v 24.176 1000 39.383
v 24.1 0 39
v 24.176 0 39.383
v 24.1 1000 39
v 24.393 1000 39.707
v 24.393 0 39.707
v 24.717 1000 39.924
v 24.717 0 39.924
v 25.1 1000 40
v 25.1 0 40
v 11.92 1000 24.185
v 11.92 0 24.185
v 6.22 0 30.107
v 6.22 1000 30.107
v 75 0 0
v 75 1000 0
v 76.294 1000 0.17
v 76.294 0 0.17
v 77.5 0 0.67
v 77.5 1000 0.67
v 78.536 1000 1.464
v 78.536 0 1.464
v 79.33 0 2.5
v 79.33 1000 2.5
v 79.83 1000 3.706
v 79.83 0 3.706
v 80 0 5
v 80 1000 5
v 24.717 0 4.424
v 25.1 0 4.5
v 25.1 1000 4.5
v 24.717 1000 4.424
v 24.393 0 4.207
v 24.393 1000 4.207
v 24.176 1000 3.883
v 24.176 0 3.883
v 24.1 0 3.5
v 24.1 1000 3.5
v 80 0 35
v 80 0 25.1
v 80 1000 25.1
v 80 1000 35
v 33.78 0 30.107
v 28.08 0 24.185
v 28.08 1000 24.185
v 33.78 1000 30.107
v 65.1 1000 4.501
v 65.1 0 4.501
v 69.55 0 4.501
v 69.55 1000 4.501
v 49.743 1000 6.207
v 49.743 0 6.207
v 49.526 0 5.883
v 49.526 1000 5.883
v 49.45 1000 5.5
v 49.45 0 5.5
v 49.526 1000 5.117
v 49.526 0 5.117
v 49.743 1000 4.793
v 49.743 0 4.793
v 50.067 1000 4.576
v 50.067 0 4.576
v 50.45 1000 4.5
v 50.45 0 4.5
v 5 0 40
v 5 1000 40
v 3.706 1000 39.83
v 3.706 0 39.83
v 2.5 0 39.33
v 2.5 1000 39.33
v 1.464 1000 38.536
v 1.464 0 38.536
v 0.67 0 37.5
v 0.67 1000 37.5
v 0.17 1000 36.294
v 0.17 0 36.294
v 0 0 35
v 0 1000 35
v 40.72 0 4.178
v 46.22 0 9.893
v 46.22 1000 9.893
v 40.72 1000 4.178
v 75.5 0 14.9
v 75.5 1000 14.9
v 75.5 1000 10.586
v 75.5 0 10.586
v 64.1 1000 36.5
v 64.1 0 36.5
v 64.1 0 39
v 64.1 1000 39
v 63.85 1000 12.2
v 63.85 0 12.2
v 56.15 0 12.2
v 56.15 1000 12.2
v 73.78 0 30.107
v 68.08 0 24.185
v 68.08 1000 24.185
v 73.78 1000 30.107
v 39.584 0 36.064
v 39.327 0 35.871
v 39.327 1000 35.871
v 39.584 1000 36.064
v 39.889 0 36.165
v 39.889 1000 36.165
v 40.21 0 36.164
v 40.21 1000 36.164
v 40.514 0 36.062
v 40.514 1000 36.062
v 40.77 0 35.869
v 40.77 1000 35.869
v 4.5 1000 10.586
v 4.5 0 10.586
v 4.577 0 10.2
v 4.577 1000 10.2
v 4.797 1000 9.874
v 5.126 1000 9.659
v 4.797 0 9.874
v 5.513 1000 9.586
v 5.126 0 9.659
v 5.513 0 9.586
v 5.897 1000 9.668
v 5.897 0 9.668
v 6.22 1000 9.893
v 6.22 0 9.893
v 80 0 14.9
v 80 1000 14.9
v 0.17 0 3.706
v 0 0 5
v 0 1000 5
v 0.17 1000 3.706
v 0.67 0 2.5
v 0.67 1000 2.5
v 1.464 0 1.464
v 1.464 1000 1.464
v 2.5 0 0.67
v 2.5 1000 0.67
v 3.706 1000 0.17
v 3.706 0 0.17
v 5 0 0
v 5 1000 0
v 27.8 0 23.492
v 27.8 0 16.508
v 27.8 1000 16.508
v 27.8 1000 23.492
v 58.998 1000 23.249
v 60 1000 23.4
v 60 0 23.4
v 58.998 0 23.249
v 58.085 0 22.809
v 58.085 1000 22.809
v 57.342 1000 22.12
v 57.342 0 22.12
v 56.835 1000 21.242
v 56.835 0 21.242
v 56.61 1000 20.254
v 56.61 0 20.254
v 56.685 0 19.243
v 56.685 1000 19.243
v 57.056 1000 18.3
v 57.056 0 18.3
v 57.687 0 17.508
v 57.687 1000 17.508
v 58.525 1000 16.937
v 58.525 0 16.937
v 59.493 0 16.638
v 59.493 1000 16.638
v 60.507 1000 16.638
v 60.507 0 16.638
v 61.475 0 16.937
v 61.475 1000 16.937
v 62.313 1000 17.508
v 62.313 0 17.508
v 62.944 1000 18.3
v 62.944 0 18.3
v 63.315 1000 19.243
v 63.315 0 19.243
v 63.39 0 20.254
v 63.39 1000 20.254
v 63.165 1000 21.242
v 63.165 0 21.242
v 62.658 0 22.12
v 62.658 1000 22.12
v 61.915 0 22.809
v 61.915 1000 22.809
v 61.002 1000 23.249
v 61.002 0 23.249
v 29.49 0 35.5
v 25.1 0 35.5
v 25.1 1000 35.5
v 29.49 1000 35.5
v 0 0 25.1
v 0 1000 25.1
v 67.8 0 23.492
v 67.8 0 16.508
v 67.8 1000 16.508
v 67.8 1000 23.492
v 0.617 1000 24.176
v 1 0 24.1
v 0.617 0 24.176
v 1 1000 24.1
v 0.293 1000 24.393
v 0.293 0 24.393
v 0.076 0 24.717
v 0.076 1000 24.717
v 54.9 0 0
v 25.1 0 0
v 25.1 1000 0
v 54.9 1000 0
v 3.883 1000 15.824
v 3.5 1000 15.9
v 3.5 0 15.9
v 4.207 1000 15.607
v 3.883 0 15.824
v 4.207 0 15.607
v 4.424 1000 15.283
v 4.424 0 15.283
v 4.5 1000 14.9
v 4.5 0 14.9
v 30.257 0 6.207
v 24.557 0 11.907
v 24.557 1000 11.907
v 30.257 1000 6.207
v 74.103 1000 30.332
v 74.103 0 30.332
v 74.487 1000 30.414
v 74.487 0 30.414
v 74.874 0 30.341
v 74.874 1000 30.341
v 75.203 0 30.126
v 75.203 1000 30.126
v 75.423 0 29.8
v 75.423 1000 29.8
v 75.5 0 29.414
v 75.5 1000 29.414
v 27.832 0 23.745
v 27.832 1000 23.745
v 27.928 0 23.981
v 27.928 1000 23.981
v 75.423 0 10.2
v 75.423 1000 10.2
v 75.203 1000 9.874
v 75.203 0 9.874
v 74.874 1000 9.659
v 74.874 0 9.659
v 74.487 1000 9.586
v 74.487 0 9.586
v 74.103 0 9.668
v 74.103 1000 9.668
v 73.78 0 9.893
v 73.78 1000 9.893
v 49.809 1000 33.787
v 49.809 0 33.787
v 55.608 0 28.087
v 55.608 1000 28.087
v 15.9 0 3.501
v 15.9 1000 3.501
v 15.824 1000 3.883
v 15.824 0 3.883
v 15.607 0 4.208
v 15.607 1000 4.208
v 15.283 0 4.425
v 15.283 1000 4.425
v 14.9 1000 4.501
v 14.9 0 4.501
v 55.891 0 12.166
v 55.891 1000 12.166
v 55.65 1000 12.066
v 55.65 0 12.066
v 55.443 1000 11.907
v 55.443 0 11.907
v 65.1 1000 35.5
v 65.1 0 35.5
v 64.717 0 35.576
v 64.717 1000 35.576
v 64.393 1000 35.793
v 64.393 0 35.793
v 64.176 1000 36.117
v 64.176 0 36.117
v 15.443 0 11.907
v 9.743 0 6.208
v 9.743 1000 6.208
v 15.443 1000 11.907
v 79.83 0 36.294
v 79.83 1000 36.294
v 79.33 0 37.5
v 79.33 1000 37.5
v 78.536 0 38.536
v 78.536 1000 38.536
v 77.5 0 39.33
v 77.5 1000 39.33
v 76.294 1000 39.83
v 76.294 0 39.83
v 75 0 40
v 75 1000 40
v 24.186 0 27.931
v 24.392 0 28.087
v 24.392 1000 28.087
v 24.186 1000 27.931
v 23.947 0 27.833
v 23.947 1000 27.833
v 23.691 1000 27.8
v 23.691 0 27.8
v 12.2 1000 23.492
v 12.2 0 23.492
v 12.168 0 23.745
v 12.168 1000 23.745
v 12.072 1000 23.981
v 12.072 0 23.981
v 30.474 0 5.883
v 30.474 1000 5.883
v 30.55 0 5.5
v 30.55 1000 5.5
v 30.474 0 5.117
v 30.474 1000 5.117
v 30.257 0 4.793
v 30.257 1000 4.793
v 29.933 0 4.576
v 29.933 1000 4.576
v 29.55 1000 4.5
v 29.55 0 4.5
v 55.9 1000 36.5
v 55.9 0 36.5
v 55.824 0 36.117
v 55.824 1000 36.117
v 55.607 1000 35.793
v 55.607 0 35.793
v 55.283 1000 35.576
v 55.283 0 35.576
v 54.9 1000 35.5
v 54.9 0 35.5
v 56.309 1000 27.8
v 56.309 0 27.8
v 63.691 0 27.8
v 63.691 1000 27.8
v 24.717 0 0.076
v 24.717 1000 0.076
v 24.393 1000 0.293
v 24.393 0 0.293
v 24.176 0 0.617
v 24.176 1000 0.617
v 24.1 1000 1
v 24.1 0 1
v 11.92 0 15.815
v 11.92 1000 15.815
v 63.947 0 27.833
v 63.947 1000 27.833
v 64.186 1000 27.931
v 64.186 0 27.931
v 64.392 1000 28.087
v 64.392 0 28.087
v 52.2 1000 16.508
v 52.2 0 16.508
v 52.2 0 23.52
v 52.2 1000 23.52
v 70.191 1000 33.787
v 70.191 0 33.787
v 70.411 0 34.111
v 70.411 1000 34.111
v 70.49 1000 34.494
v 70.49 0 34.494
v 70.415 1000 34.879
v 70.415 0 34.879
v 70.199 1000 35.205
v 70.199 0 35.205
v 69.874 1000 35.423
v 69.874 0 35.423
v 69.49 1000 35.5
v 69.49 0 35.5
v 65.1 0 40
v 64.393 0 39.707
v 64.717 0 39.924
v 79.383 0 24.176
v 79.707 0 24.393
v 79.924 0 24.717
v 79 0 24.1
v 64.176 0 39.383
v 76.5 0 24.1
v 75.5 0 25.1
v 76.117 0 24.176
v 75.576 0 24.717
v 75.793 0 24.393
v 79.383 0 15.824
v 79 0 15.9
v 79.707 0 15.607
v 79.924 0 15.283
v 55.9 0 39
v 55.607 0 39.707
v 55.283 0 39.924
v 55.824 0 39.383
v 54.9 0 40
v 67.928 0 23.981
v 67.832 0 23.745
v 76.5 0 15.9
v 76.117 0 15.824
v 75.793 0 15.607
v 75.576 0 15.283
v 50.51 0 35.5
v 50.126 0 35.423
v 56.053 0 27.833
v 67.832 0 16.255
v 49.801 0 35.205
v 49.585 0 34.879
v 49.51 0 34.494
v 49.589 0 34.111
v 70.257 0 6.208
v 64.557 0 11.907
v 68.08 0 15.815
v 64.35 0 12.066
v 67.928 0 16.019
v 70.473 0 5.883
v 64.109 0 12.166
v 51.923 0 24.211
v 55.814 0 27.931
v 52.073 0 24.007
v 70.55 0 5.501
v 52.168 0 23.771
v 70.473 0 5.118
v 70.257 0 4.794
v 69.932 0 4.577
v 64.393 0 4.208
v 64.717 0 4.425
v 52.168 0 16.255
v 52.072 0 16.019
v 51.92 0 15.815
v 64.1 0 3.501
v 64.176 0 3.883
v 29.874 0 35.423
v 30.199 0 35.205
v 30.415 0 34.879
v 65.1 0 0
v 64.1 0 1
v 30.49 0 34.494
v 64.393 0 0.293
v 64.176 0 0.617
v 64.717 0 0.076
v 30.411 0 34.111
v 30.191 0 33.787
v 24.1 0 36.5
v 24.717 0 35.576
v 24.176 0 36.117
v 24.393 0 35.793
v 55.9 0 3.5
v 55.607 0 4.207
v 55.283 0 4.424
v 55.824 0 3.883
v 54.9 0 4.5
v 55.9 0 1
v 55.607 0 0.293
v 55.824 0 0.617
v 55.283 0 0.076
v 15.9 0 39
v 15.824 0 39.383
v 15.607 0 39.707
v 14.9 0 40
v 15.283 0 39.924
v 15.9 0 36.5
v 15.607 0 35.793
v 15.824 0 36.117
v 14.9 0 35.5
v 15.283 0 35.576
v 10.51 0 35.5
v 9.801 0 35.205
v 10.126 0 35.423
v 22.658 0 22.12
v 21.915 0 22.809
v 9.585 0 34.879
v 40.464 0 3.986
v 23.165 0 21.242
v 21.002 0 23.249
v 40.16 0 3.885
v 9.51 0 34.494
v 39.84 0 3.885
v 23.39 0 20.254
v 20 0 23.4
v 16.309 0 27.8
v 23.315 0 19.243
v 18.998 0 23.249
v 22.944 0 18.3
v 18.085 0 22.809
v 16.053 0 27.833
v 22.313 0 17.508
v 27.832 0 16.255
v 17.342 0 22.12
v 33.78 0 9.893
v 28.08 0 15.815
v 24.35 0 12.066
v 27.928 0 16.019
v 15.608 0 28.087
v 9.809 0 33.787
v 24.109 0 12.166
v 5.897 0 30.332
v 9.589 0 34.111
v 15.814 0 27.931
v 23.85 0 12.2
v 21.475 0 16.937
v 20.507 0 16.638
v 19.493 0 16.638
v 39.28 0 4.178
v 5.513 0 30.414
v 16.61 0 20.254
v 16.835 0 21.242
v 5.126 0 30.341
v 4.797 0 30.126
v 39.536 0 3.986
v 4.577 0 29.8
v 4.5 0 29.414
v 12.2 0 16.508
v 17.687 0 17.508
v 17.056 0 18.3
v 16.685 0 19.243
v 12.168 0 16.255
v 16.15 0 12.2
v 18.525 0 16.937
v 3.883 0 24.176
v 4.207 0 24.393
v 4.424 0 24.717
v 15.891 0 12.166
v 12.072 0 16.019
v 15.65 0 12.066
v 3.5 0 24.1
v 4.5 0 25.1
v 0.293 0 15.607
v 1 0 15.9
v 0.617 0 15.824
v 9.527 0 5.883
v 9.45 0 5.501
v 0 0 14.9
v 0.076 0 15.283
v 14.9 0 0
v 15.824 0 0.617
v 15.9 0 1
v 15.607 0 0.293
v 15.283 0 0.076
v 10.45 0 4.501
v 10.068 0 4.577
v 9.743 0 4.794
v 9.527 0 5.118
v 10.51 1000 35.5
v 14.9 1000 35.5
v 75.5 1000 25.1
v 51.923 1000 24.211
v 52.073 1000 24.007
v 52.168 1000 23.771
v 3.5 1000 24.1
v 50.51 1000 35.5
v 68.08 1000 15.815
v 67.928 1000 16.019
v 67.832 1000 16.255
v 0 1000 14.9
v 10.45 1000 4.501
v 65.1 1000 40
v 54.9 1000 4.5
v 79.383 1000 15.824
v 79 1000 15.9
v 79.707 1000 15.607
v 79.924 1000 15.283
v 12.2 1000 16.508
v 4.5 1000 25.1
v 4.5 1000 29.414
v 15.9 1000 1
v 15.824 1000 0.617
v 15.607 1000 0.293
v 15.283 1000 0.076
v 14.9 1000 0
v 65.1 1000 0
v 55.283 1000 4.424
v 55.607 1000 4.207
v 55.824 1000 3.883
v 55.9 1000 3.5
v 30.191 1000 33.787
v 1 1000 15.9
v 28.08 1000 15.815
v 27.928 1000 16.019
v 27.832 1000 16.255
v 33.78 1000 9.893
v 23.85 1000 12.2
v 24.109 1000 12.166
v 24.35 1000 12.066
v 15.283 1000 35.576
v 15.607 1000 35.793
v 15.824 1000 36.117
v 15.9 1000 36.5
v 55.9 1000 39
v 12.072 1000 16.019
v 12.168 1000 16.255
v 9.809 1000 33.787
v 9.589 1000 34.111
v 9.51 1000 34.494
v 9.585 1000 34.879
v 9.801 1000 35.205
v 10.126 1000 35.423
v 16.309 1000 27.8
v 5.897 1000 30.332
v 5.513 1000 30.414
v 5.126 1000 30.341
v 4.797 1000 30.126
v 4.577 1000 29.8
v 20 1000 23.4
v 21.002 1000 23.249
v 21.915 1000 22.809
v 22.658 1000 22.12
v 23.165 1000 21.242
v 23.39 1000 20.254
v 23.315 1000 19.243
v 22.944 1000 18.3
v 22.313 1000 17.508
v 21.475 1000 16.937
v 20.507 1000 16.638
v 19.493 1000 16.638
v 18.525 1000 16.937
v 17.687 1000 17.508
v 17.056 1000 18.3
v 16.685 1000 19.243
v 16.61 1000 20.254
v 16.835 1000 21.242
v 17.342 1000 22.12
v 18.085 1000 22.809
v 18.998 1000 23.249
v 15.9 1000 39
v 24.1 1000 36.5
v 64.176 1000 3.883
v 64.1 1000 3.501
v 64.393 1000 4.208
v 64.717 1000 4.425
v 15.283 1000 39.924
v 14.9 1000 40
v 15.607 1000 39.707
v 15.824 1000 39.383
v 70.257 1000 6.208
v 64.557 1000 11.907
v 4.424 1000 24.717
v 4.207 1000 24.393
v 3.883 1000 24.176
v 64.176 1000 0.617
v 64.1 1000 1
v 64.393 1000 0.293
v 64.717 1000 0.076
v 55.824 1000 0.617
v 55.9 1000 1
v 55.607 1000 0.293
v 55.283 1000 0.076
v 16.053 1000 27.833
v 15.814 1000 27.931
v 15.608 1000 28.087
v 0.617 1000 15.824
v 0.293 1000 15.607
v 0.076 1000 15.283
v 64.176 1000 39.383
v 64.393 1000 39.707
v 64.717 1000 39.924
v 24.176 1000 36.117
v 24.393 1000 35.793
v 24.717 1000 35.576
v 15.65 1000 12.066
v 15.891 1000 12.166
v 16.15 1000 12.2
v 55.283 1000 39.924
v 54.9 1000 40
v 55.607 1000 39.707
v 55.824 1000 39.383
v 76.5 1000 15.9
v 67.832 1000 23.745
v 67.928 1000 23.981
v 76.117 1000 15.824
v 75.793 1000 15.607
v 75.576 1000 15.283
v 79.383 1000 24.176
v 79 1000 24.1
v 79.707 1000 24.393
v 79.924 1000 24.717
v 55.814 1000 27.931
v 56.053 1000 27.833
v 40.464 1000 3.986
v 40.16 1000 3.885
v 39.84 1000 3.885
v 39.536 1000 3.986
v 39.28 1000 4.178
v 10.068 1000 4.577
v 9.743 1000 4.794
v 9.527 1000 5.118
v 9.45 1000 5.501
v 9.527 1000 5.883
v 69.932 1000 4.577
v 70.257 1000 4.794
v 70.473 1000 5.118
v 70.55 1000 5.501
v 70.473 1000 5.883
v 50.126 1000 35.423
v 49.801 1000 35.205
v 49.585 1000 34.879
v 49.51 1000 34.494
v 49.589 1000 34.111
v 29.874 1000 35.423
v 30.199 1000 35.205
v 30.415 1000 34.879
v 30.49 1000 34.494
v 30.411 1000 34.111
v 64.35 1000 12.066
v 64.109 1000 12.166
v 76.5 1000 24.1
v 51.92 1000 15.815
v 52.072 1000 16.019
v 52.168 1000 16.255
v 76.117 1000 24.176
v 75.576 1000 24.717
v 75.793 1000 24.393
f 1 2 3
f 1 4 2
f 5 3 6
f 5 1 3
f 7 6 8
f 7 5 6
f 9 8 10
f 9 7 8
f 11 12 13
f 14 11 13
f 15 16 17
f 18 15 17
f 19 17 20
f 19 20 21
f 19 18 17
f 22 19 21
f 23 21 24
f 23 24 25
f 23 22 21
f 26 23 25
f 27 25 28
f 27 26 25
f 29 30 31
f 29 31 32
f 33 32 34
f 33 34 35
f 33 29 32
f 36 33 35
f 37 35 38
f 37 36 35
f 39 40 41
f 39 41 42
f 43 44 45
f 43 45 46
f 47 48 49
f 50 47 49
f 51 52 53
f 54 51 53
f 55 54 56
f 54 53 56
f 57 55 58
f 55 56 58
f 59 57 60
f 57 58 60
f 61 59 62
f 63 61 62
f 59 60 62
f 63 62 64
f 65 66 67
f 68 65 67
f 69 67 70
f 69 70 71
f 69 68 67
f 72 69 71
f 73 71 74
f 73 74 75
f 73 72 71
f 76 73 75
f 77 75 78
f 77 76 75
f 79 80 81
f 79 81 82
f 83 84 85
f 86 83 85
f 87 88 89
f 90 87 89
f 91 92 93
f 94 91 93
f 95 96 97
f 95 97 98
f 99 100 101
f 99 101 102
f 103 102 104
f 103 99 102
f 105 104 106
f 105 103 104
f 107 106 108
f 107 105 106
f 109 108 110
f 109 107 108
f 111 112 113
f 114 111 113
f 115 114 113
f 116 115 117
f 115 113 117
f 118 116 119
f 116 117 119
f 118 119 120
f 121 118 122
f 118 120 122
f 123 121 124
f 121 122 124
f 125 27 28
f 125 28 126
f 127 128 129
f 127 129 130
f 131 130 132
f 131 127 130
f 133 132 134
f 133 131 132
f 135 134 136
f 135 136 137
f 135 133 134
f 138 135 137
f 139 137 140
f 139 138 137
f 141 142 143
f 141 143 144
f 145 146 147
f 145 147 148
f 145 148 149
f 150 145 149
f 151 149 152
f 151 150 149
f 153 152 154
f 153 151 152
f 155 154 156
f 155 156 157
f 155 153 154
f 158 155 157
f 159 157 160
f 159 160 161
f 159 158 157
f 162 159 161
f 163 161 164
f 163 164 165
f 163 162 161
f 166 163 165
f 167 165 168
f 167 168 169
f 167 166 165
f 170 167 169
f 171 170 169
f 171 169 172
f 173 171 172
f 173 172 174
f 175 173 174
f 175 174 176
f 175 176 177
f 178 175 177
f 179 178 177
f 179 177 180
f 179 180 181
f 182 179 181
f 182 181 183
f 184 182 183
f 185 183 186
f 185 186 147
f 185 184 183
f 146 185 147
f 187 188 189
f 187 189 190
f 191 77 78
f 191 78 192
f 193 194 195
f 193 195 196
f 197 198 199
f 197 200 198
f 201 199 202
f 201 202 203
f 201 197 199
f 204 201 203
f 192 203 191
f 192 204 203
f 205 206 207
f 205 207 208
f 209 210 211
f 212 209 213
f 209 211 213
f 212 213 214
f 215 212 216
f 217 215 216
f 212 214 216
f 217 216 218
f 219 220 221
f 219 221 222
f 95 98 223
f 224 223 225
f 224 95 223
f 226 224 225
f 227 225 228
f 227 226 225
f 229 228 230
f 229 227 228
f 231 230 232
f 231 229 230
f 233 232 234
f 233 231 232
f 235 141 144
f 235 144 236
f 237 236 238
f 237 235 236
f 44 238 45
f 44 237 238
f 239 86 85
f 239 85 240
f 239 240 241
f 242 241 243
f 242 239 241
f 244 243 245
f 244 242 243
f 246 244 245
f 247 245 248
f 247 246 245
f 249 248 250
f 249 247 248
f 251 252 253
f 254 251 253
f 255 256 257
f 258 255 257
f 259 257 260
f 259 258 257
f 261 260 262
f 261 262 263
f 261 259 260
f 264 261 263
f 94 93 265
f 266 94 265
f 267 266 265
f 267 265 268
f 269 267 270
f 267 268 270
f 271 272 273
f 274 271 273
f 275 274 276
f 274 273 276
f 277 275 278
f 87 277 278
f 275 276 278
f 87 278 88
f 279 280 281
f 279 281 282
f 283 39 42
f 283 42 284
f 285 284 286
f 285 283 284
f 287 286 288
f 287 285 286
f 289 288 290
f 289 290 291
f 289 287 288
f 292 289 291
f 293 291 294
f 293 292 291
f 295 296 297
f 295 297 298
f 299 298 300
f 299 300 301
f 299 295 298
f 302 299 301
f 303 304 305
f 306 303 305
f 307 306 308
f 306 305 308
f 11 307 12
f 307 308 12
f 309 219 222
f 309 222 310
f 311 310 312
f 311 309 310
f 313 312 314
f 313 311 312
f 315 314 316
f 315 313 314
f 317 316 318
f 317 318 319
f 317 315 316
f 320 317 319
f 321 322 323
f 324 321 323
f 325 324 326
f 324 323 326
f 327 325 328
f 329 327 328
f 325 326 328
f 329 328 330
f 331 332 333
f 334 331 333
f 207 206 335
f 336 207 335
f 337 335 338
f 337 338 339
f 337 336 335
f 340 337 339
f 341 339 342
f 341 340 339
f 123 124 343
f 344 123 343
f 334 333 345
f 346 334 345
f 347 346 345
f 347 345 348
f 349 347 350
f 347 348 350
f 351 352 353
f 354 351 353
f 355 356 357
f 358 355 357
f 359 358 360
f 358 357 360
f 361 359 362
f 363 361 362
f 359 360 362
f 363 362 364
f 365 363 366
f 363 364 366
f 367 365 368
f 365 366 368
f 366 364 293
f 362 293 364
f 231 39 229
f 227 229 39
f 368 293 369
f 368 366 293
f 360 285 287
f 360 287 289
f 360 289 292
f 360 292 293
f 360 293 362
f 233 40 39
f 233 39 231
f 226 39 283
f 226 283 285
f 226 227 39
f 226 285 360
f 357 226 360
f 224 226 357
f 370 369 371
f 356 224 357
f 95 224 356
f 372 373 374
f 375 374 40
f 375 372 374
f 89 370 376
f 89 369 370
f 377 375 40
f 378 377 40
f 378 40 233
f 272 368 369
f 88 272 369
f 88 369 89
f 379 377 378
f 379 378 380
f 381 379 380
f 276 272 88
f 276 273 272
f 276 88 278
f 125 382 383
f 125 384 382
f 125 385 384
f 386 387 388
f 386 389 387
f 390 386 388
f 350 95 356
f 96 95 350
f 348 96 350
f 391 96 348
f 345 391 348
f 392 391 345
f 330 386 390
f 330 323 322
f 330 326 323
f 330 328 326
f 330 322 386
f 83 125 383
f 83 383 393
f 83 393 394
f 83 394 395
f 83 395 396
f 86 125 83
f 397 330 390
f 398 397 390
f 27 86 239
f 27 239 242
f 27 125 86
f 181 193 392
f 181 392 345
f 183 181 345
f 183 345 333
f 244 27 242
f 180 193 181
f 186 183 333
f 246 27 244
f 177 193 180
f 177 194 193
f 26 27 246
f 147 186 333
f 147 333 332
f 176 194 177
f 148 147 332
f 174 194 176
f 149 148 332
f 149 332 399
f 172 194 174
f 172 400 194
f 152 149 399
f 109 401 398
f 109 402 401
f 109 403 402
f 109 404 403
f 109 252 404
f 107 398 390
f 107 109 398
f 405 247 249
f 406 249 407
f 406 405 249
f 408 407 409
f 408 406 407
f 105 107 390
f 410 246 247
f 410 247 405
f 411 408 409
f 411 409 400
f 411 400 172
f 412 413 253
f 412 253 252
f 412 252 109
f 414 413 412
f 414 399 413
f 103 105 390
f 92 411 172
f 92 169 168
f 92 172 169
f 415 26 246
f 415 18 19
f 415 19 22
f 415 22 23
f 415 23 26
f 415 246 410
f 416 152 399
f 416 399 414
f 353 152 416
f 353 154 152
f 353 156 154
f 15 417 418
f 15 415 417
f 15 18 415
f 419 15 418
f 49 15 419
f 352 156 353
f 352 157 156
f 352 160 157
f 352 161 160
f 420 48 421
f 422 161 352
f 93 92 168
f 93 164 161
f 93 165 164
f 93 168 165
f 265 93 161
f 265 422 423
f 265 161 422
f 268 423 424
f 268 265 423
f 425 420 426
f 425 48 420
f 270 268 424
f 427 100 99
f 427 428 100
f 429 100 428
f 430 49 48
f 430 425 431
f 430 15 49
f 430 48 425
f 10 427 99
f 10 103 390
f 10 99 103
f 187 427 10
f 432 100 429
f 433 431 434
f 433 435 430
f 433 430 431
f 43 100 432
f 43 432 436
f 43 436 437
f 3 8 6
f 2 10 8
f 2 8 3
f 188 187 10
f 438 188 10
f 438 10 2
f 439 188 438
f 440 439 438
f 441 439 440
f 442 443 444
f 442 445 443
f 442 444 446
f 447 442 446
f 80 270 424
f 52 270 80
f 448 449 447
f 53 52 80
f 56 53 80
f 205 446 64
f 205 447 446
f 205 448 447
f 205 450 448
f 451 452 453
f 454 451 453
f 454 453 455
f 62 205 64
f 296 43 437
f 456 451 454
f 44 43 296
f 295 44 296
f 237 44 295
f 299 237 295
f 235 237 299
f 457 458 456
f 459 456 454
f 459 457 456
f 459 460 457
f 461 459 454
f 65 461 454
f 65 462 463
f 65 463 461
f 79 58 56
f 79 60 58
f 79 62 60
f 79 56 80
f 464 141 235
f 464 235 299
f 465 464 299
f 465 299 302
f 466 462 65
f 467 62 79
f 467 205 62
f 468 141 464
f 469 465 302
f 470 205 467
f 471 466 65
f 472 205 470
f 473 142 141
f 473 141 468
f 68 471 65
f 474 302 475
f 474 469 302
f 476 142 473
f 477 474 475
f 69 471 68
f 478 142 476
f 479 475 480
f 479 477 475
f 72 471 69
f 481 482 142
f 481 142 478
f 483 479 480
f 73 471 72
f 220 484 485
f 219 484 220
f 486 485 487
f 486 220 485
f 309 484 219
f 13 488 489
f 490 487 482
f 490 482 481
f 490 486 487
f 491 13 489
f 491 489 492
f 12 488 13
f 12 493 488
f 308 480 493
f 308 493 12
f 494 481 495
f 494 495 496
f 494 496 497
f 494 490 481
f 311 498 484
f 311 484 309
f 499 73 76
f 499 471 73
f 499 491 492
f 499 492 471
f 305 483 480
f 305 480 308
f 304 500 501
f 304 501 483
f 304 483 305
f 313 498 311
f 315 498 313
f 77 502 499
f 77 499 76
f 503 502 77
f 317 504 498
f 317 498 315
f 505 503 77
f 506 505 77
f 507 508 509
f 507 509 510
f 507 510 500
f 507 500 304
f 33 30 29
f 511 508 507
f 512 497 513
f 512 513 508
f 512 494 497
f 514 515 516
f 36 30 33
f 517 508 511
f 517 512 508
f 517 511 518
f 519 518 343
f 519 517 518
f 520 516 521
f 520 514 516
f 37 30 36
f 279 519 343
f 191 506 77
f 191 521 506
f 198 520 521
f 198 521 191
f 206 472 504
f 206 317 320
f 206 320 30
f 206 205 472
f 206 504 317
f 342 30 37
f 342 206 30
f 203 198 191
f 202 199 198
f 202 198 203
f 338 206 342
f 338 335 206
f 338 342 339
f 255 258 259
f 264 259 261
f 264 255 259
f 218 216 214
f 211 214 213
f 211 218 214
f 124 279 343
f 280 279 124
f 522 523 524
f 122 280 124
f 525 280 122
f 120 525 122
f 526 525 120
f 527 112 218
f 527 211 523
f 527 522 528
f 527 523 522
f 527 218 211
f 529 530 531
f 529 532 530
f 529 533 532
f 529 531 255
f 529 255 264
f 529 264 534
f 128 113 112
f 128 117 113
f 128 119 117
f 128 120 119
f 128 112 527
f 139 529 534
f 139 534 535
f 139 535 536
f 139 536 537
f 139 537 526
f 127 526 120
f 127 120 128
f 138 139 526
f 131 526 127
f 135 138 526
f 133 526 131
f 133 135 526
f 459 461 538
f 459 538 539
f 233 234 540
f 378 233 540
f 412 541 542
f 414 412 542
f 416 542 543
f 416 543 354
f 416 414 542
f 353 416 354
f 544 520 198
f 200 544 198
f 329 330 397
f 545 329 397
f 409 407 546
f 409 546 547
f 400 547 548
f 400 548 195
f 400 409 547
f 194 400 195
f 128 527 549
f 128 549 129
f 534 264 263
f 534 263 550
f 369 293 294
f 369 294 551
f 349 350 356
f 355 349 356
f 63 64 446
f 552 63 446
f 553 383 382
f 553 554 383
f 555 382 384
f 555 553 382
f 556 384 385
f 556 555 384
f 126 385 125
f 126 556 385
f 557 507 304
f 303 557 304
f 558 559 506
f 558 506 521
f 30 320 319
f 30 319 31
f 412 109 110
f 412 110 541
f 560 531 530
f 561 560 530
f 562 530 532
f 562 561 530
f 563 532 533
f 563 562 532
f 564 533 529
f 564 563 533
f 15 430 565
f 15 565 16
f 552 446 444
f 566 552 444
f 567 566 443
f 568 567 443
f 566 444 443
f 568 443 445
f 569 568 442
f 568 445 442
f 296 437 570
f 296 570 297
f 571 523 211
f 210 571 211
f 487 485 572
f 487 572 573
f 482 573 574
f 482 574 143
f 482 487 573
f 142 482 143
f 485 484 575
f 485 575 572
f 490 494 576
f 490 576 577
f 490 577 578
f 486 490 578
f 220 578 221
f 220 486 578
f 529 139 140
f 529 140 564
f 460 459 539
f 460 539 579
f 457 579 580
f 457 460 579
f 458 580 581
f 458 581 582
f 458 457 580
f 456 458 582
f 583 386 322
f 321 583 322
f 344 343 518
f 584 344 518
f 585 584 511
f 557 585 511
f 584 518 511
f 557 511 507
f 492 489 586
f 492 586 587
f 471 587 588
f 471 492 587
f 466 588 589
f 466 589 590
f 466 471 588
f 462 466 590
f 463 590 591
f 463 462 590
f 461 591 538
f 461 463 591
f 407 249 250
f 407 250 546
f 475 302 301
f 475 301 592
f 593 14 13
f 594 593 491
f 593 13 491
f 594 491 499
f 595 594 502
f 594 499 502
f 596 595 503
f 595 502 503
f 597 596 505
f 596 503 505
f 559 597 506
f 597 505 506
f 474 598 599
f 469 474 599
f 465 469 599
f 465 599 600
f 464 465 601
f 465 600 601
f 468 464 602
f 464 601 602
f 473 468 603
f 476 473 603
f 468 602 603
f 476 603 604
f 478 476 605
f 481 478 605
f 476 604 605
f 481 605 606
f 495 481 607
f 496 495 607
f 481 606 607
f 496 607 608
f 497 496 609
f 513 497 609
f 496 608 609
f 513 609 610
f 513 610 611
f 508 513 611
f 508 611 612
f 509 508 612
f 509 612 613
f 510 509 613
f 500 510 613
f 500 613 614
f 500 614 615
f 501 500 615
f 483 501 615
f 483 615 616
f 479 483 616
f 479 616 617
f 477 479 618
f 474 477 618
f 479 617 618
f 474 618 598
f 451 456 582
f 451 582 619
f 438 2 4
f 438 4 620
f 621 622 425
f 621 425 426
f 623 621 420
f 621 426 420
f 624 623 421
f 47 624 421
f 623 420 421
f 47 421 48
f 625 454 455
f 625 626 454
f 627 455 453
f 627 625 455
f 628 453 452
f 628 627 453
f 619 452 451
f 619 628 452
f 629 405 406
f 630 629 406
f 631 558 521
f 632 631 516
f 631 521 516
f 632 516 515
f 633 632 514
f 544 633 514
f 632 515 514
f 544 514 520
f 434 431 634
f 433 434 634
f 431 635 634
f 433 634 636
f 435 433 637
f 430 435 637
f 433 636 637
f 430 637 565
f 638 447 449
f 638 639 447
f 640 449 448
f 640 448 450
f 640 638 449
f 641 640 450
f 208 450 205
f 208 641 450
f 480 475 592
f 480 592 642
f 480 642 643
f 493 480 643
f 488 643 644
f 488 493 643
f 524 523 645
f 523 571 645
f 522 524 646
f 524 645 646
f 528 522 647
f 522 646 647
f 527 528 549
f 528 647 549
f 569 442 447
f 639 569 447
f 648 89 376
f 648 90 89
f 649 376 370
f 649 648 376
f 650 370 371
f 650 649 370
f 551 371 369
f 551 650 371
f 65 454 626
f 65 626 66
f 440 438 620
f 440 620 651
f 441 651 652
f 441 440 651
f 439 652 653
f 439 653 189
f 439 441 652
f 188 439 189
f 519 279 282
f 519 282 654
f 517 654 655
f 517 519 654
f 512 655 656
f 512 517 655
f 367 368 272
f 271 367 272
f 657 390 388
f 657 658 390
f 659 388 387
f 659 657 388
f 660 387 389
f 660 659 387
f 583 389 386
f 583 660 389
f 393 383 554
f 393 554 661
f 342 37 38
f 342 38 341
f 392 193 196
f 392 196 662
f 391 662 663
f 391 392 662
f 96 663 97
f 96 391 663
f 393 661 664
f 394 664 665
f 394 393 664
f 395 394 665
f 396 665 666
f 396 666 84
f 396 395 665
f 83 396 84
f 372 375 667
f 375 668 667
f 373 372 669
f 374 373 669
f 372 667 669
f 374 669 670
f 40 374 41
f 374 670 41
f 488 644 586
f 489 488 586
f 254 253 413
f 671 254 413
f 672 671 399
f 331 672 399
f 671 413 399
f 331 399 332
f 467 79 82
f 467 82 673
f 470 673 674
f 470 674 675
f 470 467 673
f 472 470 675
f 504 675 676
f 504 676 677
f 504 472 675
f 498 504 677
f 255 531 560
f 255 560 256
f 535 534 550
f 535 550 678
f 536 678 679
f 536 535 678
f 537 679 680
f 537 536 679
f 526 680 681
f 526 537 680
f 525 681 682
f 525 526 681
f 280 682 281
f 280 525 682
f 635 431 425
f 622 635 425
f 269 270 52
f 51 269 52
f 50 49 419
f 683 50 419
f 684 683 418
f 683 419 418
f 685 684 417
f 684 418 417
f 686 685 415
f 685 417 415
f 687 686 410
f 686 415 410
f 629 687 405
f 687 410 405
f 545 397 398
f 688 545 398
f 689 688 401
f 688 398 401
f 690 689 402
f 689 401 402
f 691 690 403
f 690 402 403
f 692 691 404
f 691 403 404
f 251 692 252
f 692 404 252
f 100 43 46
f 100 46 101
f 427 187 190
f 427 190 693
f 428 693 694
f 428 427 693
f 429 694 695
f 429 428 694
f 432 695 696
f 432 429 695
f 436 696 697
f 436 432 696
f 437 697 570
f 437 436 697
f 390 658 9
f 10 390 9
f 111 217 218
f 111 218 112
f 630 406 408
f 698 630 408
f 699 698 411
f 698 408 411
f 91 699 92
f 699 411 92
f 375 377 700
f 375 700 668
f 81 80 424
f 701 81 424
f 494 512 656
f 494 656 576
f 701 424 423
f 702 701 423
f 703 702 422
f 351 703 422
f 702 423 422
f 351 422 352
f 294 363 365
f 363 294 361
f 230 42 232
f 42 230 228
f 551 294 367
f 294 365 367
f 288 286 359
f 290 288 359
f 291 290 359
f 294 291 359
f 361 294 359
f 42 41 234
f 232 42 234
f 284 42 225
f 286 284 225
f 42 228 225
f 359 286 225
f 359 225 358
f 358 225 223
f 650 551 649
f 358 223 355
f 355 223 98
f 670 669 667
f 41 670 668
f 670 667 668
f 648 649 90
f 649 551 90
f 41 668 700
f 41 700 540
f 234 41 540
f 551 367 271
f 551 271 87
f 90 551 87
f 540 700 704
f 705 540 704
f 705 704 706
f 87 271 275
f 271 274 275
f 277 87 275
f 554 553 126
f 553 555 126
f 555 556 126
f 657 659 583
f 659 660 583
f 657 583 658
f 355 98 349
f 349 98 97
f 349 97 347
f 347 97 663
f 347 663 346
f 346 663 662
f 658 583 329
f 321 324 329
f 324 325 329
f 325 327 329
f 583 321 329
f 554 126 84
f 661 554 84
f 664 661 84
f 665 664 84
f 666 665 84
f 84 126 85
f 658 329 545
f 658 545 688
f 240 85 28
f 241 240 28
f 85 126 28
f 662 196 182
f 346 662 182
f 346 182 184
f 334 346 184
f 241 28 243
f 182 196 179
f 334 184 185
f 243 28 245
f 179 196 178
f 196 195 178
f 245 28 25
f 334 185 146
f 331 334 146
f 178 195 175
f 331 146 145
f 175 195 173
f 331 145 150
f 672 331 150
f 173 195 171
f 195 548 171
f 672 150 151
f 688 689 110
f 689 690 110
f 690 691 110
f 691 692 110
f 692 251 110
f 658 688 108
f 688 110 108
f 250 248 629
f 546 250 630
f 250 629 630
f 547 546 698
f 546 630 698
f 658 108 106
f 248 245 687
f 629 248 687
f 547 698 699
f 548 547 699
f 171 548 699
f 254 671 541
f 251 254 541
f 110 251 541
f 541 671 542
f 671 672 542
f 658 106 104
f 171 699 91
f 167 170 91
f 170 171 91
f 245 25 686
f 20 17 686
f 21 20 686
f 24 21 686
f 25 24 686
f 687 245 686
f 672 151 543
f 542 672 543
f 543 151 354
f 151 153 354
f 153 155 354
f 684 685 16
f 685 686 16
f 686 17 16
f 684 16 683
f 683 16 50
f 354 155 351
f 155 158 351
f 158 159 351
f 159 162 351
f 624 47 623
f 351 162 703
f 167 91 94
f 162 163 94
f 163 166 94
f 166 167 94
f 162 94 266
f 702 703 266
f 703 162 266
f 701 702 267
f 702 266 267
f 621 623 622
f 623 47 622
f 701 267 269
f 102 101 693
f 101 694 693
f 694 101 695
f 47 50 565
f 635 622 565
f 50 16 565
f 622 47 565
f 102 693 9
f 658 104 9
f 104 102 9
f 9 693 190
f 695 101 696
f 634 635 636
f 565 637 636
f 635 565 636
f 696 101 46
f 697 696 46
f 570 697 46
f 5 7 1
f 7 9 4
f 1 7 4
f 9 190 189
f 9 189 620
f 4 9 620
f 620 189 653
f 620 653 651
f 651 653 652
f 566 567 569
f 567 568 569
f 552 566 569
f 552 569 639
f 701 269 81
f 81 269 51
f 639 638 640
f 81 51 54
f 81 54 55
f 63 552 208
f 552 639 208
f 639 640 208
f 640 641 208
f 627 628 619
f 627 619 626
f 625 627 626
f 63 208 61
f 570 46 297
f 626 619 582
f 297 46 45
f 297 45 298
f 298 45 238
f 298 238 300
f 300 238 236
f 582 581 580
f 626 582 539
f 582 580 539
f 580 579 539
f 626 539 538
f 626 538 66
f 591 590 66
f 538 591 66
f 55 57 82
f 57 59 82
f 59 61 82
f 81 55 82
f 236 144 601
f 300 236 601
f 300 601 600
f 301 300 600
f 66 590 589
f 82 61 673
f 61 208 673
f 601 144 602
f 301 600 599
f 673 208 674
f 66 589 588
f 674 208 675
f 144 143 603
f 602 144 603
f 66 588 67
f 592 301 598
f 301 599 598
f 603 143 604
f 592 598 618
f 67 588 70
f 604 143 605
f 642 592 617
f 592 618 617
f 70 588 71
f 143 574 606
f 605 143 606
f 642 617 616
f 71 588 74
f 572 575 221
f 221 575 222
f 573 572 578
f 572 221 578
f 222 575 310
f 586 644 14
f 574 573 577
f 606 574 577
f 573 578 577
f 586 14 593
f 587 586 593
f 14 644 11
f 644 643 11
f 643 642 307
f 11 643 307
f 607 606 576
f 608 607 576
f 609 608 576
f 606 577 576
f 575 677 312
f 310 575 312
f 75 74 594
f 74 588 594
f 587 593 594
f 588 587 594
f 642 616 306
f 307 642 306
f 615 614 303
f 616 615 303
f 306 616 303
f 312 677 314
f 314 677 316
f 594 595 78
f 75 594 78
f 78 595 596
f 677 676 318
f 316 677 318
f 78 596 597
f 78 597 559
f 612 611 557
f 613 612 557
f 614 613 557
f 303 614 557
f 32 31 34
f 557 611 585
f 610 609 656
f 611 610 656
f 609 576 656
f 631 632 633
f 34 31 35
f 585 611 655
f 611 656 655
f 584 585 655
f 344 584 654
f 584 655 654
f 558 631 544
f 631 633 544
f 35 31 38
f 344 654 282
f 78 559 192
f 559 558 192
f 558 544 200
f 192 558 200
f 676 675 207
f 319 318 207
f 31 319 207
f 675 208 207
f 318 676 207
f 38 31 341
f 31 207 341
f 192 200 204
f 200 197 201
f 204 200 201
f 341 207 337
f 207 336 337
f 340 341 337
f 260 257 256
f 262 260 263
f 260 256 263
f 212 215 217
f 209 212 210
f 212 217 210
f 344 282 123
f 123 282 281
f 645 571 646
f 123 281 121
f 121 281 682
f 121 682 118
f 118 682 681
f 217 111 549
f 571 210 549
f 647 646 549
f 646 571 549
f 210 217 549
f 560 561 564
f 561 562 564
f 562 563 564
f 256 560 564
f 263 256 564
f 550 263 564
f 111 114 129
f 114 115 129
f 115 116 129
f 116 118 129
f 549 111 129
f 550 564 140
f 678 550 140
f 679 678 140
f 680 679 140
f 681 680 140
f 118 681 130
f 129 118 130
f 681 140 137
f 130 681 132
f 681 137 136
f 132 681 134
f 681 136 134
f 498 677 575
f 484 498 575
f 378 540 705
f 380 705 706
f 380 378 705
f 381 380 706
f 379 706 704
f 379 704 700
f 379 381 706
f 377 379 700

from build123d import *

# Parameters (mm, degrees)
BOSS_EXTRUDE1_DEPTH   = 1000
SKETCH3_R             = 3.4
CUT_EXTRUDE1_DEPTH    = 1000
CUT_EXTRUDE2_DEPTH    = 1000
FILLET1_R             = 1
FILLET2_R             = 1
FILLET3_R             = 1
CUT_EXTRUDE3_DEPTH    = 1000
CUT_EXTRUDE4_DEPTH    = 1000
FILLET4_R             = 1
FILLET5_R             = 1
FILLET6_R             = 1
FILLET7_R             = 1
FILLET8_R             = 1
FILLET9_R             = 1
FILLET10_R            = 1
FILLET11_R            = 1
MIRROR11_COPY_1_DEPTH = 1000
MIRROR11_COPY_2_DEPTH = 1000
CUT_EXTRUDE5_DEPTH    = 1000


with BuildPart() as part:
    # Sketch1 → Boss-Extrude1 (new body)
    with BuildSketch(Plane(origin=(0, 0, 0), x_dir=(1, 0, 0), z_dir=(0, 1, 0))):
        with BuildLine():
            Line((5, 0), (75, 0))
            ThreePointArc((75, 0), (78.535533906, -1.464466094), (80, -5))
            Line((80, -5), (80, -35))
            ThreePointArc((80, -35), (78.535533906, -38.535533906), (75, -40))
            Line((75, -40), (5, -40))
            ThreePointArc((5, -40), (1.464466094, -38.535533906), (0, -35))
            Line((0, -35), (0, -5))
            ThreePointArc((0, -5), (1.464466094, -1.464466094), (5, 0))
        make_face()
    extrude(amount=BOSS_EXTRUDE1_DEPTH)

    # Sketch3 → Cut-Extrude1 (cut)
    with BuildSketch(Plane(origin=(0, 1000, 0), x_dir=(1, 0, 0), z_dir=(0, 1, 0))):
        with Locations(Location((20, -20, 0), (0, 0, 270))):
            Circle(SKETCH3_R)
    cut_extrude1 = extrude(amount=-CUT_EXTRUDE1_DEPTH, mode=Mode.SUBTRACT)

    # Mirror3: Cut-Extrude1 across plane
    add(cut_extrude1.mirror(Plane(origin=(40, 0, 0), x_dir=(0, 0, 1), z_dir=(1, 0, 0))), mode=Mode.SUBTRACT)

    # Sketch7 → Cut-Extrude2 (cut)
    with BuildSketch(Plane(origin=(0, 0, 0), x_dir=(-1, 0, 0), z_dir=(0, -1, 0))):
        with BuildLine():
            Line((-15.9, -40), (-24.1, -40))
            Line((-24.1, -40), (-24.1, -36.5))
            ThreePointArc((-24.1, -36.5), (-24.392893219, -35.792893219), (-25.1, -35.5))
            Line((-25.1, -35.5), (-29.489753594, -35.5))
            ThreePointArc((-29.489753594, -35.5), (-30.415270825, -34.8787055), (-30.190750526, -33.786835712))
            Line((-30.190750526, -33.786835712), (-24.391814382, -28.086835712))
            ThreePointArc((-24.391814382, -28.086835712), (-24.069522951, -27.874482769), (-23.69081745, -27.8))
            Line((-23.69081745, -27.8), (-16.309186536, -27.8))
            ThreePointArc((-16.309186536, -27.8), (-15.930477876, -27.874484063), (-15.608184734, -28.086840499))
            Line((-15.608184734, -28.086840499), (-9.809327805, -33.786840499))
            ThreePointArc((-9.809327805, -33.786840499), (-9.584813669, -34.87870866), (-10.510329607, -35.5))
            Line((-10.510329607, -35.5), (-14.9, -35.5))
            ThreePointArc((-14.9, -35.5), (-15.607106781, -35.792893219), (-15.9, -36.5))
            Line((-15.9, -36.5), (-15.9, -40))
        make_face()
    cut_extrude2 = extrude(amount=-CUT_EXTRUDE2_DEPTH, mode=Mode.SUBTRACT)

    # Fillet1
    fillet1_edges = [part.edges().sort_by_distance(p)[0] for p in [
        (15.9, 500, 40),
        (24.1, 500, 40),
    ]]
    fillet(fillet1_edges, radius=FILLET1_R)

    # Mirror8: Cut-Extrude2 across plane
    add(cut_extrude2.mirror(Plane(origin=(40, 0, 0), x_dir=(0, 0, 1), z_dir=(1, 0, 0))), mode=Mode.SUBTRACT)

    # Fillet2
    fillet2_edges = [part.edges().sort_by_distance(p)[0] for p in [
        (55.9, 500, 40),
    ]]
    fillet(fillet2_edges, radius=FILLET2_R)

    # Fillet3
    fillet3_edges = [part.edges().sort_by_distance(p)[0] for p in [
        (64.1, 500, 40),
    ]]
    fillet(fillet3_edges, radius=FILLET3_R)

    # Sketch9 → Cut-Extrude3 (cut)
    with BuildSketch(Plane(origin=(0, 0, 0), x_dir=(1, 0, 0), z_dir=(0, 1, 0))):
        with BuildLine():
            Line((14.899846923, -4.500713815), (10.450461284, -4.500713815))
            ThreePointArc((10.450461284, -4.500713815), (9.526581751, -5.118030383), (9.743354502, -6.207820596))
            Line((9.743354502, -6.207820596), (15.442640687, -11.907106781))
            ThreePointArc((15.442640687, -11.907106781), (15.767064036, -12.123879533), (16.149747468, -12.2))
            Line((16.149747468, -12.2), (23.850252532, -12.2))
            ThreePointArc((23.850252532, -12.2), (24.232935964, -12.123879533), (24.557359313, -11.907106781))
            Line((24.557359313, -11.907106781), (30.257359313, -6.207106781))
            ThreePointArc((30.257359313, -6.207106781), (30.474132064, -5.117316568), (29.550252532, -4.5))
            Line((29.550252532, -4.5), (25.099846964, -4.5))
            ThreePointArc((25.099846964, -4.5), (24.392724723, -4.207091321), (24.099846965, -3.499956273))
            Line((24.099846965, -3.499956273), (24.100000008, 0))
            Line((24.100000008, 0), (15.9, 0))
            Line((15.9, 0), (15.899846922, -3.500757542))
            ThreePointArc((15.899846922, -3.500757542), (15.606938244, -4.207836056), (14.899846923, -4.500713815))
        make_face()
    cut_extrude3 = extrude(amount=CUT_EXTRUDE3_DEPTH, mode=Mode.SUBTRACT)

    # Mirror9: Cut-Extrude3 across plane
    add(cut_extrude3.mirror(Plane(origin=(40, 0, 0), x_dir=(0, 0, 1), z_dir=(1, 0, 0))), mode=Mode.SUBTRACT)

    # Sketch10 → Cut-Extrude4 (cut)
    with BuildSketch(Plane(origin=(0, 0, 0), x_dir=(1, 0, 0), z_dir=(0, 1, 0))):
        with BuildLine():
            Line((4.5, -14.9), (4.5, -10.58605332))
            ThreePointArc((4.5, -10.58605332), (5.126159695, -9.658560233), (6.220486853, -9.892584724))
            Line((6.220486853, -9.892584724), (11.920486853, -15.814662646))
            ThreePointArc((11.920486853, -15.814662646), (12.127493087, -16.134290938), (12.2, -16.508131242))
            Line((12.2, -16.508131242), (12.2, -23.491868758))
            ThreePointArc((12.2, -23.491868758), (12.127493087, -23.865709062), (11.920486853, -24.185337354))
            Line((11.920486853, -24.185337354), (6.220486853, -30.107415276))
            ThreePointArc((6.220486853, -30.107415276), (5.126159695, -30.341439767), (4.5, -29.41394668))
            Line((4.5, -29.41394668), (4.5, -25.1))
            ThreePointArc((4.5, -25.1), (4.207106781, -24.392893219), (3.5, -24.1))
            Line((3.5, -24.1), (0, -24.1))
            Line((0, -24.1), (0, -15.9))
            Line((0, -15.9), (3.5, -15.9))
            ThreePointArc((3.5, -15.9), (4.207106781, -15.607106781), (4.5, -14.9))
        make_face()
    cut_extrude4 = extrude(amount=CUT_EXTRUDE4_DEPTH, mode=Mode.SUBTRACT)

    # Fillet4
    fillet4_edges = [part.edges().sort_by_distance(p)[0] for p in [
        (24.100000008, 500, 0),
    ]]
    fillet(fillet4_edges, radius=FILLET4_R)

    # Fillet5
    fillet5_edges = [part.edges().sort_by_distance(p)[0] for p in [
        (64.1, 500, 0),
    ]]
    fillet(fillet5_edges, radius=FILLET5_R)

    # Fillet6
    fillet6_edges = [part.edges().sort_by_distance(p)[0] for p in [
        (55.899999992, 500, 0),
    ]]
    fillet(fillet6_edges, radius=FILLET6_R)

    # Fillet7
    fillet7_edges = [part.edges().sort_by_distance(p)[0] for p in [
        (15.9, 500, 0),
    ]]
    fillet(fillet7_edges, radius=FILLET7_R)

    # Fillet8
    fillet8_edges = [part.edges().sort_by_distance(p)[0] for p in [
        (0, 500, 24.1),
    ]]
    fillet(fillet8_edges, radius=FILLET8_R)

    # Fillet9
    fillet9_edges = [part.edges().sort_by_distance(p)[0] for p in [
        (0, 500, 15.9),
    ]]
    fillet(fillet9_edges, radius=FILLET9_R)

    # Mirror10: Cut-Extrude4 across plane
    add(cut_extrude4.mirror(Plane(origin=(40, 0, 0), x_dir=(0, 0, 1), z_dir=(1, 0, 0))), mode=Mode.SUBTRACT)

    # Fillet10
    fillet10_edges = [part.edges().sort_by_distance(p)[0] for p in [
        (80, 500, 15.9),
    ]]
    fillet(fillet10_edges, radius=FILLET10_R)

    # Fillet11
    fillet11_edges = [part.edges().sort_by_distance(p)[0] for p in [
        (80, 500, 24.1),
    ]]
    fillet(fillet11_edges, radius=FILLET11_R)

    # Mirror11 copy 1 sketch → Mirror11 copy 1 (cut)
    with BuildSketch(Plane(origin=(40, 0, 0), x_dir=(1, 0, 0), z_dir=(0, 1, 0))):
        with BuildLine():
            Line((4.5, -14.9), (4.5, -10.58605332))
            ThreePointArc((4.5, -10.58605332), (5.126159695, -9.658560233), (6.220486853, -9.892584724))
            Line((6.220486853, -9.892584724), (11.920486853, -15.814662646))
            ThreePointArc((11.920486853, -15.814662646), (12.127493087, -16.134290938), (12.2, -16.508131242))
            Line((12.2, -16.508131242), (12.2, -23.491868758))
            ThreePointArc((12.2, -23.491868758), (12.127493087, -23.865709062), (11.920486853, -24.185337354))
            Line((11.920486853, -24.185337354), (6.220486853, -30.107415276))
            ThreePointArc((6.220486853, -30.107415276), (5.126159695, -30.341439767), (4.5, -29.41394668))
            Line((4.5, -29.41394668), (4.5, -25.1))
            ThreePointArc((4.5, -25.1), (4.207106781, -24.392893219), (3.5, -24.1))
            Line((3.5, -24.1), (0, -24.1))
            Line((0, -24.1), (0, -15.9))
            Line((0, -15.9), (3.5, -15.9))
            ThreePointArc((3.5, -15.9), (4.207106781, -15.607106781), (4.5, -14.9))
        make_face()
    extrude(amount=MIRROR11_COPY_1_DEPTH, mode=Mode.SUBTRACT)

    # Mirror11 copy 2 sketch → Mirror11 copy 2 (cut)
    with BuildSketch(Plane(origin=(120, 0, 0), x_dir=(-1, 0, 0), z_dir=(0, 1, 0))):
        with BuildLine():
            Line((4.5, 14.9), (4.5, 10.58605332))
            ThreePointArc((4.5, 10.58605332), (5.126159695, 9.658560233), (6.220486853, 9.892584724))
            Line((6.220486853, 9.892584724), (11.920486853, 15.814662646))
            ThreePointArc((11.920486853, 15.814662646), (12.127493087, 16.134290938), (12.2, 16.508131242))
            Line((12.2, 16.508131242), (12.2, 23.491868758))
            ThreePointArc((12.2, 23.491868758), (12.127493087, 23.865709062), (11.920486853, 24.185337354))
            Line((11.920486853, 24.185337354), (6.220486853, 30.107415276))
            ThreePointArc((6.220486853, 30.107415276), (5.126159695, 30.341439767), (4.5, 29.41394668))
            Line((4.5, 29.41394668), (4.5, 25.1))
            ThreePointArc((4.5, 25.1), (4.207106781, 24.392893219), (3.5, 24.1))
            Line((3.5, 24.1), (0, 24.1))
            Line((0, 24.1), (0, 15.9))
            Line((0, 15.9), (3.5, 15.9))
            ThreePointArc((3.5, 15.9), (4.207106781, 15.607106781), (4.5, 14.9))
        make_face()
    extrude(amount=MIRROR11_COPY_2_DEPTH, mode=Mode.SUBTRACT)

    # Mirror12: Cut-Extrude4 across plane
    add(cut_extrude4.mirror(Plane.ZY.offset(-20)), mode=Mode.SUBTRACT)

    # Sketch12 → Cut-Extrude5 (cut)
    with BuildSketch(Plane(origin=(0, 0, 0), x_dir=(-1, 0, 0), z_dir=(0, -1, 0))):
        with BuildLine():
            Line((-28.079513147, -24.185337354), (-39.327067998, -35.871108628))
            ThreePointArc((-39.327067998, -35.871108628), (-40.049082116, -36.177638866), (-40.770156561, -35.868904648))
            Line((-40.770156561, -35.868904648), (-51.922601709, -24.210885791))
            ThreePointArc((-51.922601709, -24.210885791), (-52.128062958, -23.892044517), (-52.2, -23.519621175))
            Line((-52.2, -23.519621175), (-52.2, -16.508131242))
            ThreePointArc((-52.2, -16.508131242), (-52.127493087, -16.134290938), (-51.920486853, -15.814662646))
            Line((-51.920486853, -15.814662646), (-40.720486853, -4.17829901))
            ThreePointArc((-40.720486853, -4.17829901), (-40, -3.871767606), (-39.279513147, -4.17829901))
            Line((-39.279513147, -4.17829901), (-28.079513147, -15.814662646))
            ThreePointArc((-28.079513147, -15.814662646), (-27.872506913, -16.134290938), (-27.8, -16.508131242))
            Line((-27.8, -16.508131242), (-27.8, -23.491868758))
            ThreePointArc((-27.8, -23.491868758), (-27.872506913, -23.865709062), (-28.079513147, -24.185337354))
        make_face()
    extrude(amount=-CUT_EXTRUDE5_DEPTH, mode=Mode.SUBTRACT)


solid = part.part
